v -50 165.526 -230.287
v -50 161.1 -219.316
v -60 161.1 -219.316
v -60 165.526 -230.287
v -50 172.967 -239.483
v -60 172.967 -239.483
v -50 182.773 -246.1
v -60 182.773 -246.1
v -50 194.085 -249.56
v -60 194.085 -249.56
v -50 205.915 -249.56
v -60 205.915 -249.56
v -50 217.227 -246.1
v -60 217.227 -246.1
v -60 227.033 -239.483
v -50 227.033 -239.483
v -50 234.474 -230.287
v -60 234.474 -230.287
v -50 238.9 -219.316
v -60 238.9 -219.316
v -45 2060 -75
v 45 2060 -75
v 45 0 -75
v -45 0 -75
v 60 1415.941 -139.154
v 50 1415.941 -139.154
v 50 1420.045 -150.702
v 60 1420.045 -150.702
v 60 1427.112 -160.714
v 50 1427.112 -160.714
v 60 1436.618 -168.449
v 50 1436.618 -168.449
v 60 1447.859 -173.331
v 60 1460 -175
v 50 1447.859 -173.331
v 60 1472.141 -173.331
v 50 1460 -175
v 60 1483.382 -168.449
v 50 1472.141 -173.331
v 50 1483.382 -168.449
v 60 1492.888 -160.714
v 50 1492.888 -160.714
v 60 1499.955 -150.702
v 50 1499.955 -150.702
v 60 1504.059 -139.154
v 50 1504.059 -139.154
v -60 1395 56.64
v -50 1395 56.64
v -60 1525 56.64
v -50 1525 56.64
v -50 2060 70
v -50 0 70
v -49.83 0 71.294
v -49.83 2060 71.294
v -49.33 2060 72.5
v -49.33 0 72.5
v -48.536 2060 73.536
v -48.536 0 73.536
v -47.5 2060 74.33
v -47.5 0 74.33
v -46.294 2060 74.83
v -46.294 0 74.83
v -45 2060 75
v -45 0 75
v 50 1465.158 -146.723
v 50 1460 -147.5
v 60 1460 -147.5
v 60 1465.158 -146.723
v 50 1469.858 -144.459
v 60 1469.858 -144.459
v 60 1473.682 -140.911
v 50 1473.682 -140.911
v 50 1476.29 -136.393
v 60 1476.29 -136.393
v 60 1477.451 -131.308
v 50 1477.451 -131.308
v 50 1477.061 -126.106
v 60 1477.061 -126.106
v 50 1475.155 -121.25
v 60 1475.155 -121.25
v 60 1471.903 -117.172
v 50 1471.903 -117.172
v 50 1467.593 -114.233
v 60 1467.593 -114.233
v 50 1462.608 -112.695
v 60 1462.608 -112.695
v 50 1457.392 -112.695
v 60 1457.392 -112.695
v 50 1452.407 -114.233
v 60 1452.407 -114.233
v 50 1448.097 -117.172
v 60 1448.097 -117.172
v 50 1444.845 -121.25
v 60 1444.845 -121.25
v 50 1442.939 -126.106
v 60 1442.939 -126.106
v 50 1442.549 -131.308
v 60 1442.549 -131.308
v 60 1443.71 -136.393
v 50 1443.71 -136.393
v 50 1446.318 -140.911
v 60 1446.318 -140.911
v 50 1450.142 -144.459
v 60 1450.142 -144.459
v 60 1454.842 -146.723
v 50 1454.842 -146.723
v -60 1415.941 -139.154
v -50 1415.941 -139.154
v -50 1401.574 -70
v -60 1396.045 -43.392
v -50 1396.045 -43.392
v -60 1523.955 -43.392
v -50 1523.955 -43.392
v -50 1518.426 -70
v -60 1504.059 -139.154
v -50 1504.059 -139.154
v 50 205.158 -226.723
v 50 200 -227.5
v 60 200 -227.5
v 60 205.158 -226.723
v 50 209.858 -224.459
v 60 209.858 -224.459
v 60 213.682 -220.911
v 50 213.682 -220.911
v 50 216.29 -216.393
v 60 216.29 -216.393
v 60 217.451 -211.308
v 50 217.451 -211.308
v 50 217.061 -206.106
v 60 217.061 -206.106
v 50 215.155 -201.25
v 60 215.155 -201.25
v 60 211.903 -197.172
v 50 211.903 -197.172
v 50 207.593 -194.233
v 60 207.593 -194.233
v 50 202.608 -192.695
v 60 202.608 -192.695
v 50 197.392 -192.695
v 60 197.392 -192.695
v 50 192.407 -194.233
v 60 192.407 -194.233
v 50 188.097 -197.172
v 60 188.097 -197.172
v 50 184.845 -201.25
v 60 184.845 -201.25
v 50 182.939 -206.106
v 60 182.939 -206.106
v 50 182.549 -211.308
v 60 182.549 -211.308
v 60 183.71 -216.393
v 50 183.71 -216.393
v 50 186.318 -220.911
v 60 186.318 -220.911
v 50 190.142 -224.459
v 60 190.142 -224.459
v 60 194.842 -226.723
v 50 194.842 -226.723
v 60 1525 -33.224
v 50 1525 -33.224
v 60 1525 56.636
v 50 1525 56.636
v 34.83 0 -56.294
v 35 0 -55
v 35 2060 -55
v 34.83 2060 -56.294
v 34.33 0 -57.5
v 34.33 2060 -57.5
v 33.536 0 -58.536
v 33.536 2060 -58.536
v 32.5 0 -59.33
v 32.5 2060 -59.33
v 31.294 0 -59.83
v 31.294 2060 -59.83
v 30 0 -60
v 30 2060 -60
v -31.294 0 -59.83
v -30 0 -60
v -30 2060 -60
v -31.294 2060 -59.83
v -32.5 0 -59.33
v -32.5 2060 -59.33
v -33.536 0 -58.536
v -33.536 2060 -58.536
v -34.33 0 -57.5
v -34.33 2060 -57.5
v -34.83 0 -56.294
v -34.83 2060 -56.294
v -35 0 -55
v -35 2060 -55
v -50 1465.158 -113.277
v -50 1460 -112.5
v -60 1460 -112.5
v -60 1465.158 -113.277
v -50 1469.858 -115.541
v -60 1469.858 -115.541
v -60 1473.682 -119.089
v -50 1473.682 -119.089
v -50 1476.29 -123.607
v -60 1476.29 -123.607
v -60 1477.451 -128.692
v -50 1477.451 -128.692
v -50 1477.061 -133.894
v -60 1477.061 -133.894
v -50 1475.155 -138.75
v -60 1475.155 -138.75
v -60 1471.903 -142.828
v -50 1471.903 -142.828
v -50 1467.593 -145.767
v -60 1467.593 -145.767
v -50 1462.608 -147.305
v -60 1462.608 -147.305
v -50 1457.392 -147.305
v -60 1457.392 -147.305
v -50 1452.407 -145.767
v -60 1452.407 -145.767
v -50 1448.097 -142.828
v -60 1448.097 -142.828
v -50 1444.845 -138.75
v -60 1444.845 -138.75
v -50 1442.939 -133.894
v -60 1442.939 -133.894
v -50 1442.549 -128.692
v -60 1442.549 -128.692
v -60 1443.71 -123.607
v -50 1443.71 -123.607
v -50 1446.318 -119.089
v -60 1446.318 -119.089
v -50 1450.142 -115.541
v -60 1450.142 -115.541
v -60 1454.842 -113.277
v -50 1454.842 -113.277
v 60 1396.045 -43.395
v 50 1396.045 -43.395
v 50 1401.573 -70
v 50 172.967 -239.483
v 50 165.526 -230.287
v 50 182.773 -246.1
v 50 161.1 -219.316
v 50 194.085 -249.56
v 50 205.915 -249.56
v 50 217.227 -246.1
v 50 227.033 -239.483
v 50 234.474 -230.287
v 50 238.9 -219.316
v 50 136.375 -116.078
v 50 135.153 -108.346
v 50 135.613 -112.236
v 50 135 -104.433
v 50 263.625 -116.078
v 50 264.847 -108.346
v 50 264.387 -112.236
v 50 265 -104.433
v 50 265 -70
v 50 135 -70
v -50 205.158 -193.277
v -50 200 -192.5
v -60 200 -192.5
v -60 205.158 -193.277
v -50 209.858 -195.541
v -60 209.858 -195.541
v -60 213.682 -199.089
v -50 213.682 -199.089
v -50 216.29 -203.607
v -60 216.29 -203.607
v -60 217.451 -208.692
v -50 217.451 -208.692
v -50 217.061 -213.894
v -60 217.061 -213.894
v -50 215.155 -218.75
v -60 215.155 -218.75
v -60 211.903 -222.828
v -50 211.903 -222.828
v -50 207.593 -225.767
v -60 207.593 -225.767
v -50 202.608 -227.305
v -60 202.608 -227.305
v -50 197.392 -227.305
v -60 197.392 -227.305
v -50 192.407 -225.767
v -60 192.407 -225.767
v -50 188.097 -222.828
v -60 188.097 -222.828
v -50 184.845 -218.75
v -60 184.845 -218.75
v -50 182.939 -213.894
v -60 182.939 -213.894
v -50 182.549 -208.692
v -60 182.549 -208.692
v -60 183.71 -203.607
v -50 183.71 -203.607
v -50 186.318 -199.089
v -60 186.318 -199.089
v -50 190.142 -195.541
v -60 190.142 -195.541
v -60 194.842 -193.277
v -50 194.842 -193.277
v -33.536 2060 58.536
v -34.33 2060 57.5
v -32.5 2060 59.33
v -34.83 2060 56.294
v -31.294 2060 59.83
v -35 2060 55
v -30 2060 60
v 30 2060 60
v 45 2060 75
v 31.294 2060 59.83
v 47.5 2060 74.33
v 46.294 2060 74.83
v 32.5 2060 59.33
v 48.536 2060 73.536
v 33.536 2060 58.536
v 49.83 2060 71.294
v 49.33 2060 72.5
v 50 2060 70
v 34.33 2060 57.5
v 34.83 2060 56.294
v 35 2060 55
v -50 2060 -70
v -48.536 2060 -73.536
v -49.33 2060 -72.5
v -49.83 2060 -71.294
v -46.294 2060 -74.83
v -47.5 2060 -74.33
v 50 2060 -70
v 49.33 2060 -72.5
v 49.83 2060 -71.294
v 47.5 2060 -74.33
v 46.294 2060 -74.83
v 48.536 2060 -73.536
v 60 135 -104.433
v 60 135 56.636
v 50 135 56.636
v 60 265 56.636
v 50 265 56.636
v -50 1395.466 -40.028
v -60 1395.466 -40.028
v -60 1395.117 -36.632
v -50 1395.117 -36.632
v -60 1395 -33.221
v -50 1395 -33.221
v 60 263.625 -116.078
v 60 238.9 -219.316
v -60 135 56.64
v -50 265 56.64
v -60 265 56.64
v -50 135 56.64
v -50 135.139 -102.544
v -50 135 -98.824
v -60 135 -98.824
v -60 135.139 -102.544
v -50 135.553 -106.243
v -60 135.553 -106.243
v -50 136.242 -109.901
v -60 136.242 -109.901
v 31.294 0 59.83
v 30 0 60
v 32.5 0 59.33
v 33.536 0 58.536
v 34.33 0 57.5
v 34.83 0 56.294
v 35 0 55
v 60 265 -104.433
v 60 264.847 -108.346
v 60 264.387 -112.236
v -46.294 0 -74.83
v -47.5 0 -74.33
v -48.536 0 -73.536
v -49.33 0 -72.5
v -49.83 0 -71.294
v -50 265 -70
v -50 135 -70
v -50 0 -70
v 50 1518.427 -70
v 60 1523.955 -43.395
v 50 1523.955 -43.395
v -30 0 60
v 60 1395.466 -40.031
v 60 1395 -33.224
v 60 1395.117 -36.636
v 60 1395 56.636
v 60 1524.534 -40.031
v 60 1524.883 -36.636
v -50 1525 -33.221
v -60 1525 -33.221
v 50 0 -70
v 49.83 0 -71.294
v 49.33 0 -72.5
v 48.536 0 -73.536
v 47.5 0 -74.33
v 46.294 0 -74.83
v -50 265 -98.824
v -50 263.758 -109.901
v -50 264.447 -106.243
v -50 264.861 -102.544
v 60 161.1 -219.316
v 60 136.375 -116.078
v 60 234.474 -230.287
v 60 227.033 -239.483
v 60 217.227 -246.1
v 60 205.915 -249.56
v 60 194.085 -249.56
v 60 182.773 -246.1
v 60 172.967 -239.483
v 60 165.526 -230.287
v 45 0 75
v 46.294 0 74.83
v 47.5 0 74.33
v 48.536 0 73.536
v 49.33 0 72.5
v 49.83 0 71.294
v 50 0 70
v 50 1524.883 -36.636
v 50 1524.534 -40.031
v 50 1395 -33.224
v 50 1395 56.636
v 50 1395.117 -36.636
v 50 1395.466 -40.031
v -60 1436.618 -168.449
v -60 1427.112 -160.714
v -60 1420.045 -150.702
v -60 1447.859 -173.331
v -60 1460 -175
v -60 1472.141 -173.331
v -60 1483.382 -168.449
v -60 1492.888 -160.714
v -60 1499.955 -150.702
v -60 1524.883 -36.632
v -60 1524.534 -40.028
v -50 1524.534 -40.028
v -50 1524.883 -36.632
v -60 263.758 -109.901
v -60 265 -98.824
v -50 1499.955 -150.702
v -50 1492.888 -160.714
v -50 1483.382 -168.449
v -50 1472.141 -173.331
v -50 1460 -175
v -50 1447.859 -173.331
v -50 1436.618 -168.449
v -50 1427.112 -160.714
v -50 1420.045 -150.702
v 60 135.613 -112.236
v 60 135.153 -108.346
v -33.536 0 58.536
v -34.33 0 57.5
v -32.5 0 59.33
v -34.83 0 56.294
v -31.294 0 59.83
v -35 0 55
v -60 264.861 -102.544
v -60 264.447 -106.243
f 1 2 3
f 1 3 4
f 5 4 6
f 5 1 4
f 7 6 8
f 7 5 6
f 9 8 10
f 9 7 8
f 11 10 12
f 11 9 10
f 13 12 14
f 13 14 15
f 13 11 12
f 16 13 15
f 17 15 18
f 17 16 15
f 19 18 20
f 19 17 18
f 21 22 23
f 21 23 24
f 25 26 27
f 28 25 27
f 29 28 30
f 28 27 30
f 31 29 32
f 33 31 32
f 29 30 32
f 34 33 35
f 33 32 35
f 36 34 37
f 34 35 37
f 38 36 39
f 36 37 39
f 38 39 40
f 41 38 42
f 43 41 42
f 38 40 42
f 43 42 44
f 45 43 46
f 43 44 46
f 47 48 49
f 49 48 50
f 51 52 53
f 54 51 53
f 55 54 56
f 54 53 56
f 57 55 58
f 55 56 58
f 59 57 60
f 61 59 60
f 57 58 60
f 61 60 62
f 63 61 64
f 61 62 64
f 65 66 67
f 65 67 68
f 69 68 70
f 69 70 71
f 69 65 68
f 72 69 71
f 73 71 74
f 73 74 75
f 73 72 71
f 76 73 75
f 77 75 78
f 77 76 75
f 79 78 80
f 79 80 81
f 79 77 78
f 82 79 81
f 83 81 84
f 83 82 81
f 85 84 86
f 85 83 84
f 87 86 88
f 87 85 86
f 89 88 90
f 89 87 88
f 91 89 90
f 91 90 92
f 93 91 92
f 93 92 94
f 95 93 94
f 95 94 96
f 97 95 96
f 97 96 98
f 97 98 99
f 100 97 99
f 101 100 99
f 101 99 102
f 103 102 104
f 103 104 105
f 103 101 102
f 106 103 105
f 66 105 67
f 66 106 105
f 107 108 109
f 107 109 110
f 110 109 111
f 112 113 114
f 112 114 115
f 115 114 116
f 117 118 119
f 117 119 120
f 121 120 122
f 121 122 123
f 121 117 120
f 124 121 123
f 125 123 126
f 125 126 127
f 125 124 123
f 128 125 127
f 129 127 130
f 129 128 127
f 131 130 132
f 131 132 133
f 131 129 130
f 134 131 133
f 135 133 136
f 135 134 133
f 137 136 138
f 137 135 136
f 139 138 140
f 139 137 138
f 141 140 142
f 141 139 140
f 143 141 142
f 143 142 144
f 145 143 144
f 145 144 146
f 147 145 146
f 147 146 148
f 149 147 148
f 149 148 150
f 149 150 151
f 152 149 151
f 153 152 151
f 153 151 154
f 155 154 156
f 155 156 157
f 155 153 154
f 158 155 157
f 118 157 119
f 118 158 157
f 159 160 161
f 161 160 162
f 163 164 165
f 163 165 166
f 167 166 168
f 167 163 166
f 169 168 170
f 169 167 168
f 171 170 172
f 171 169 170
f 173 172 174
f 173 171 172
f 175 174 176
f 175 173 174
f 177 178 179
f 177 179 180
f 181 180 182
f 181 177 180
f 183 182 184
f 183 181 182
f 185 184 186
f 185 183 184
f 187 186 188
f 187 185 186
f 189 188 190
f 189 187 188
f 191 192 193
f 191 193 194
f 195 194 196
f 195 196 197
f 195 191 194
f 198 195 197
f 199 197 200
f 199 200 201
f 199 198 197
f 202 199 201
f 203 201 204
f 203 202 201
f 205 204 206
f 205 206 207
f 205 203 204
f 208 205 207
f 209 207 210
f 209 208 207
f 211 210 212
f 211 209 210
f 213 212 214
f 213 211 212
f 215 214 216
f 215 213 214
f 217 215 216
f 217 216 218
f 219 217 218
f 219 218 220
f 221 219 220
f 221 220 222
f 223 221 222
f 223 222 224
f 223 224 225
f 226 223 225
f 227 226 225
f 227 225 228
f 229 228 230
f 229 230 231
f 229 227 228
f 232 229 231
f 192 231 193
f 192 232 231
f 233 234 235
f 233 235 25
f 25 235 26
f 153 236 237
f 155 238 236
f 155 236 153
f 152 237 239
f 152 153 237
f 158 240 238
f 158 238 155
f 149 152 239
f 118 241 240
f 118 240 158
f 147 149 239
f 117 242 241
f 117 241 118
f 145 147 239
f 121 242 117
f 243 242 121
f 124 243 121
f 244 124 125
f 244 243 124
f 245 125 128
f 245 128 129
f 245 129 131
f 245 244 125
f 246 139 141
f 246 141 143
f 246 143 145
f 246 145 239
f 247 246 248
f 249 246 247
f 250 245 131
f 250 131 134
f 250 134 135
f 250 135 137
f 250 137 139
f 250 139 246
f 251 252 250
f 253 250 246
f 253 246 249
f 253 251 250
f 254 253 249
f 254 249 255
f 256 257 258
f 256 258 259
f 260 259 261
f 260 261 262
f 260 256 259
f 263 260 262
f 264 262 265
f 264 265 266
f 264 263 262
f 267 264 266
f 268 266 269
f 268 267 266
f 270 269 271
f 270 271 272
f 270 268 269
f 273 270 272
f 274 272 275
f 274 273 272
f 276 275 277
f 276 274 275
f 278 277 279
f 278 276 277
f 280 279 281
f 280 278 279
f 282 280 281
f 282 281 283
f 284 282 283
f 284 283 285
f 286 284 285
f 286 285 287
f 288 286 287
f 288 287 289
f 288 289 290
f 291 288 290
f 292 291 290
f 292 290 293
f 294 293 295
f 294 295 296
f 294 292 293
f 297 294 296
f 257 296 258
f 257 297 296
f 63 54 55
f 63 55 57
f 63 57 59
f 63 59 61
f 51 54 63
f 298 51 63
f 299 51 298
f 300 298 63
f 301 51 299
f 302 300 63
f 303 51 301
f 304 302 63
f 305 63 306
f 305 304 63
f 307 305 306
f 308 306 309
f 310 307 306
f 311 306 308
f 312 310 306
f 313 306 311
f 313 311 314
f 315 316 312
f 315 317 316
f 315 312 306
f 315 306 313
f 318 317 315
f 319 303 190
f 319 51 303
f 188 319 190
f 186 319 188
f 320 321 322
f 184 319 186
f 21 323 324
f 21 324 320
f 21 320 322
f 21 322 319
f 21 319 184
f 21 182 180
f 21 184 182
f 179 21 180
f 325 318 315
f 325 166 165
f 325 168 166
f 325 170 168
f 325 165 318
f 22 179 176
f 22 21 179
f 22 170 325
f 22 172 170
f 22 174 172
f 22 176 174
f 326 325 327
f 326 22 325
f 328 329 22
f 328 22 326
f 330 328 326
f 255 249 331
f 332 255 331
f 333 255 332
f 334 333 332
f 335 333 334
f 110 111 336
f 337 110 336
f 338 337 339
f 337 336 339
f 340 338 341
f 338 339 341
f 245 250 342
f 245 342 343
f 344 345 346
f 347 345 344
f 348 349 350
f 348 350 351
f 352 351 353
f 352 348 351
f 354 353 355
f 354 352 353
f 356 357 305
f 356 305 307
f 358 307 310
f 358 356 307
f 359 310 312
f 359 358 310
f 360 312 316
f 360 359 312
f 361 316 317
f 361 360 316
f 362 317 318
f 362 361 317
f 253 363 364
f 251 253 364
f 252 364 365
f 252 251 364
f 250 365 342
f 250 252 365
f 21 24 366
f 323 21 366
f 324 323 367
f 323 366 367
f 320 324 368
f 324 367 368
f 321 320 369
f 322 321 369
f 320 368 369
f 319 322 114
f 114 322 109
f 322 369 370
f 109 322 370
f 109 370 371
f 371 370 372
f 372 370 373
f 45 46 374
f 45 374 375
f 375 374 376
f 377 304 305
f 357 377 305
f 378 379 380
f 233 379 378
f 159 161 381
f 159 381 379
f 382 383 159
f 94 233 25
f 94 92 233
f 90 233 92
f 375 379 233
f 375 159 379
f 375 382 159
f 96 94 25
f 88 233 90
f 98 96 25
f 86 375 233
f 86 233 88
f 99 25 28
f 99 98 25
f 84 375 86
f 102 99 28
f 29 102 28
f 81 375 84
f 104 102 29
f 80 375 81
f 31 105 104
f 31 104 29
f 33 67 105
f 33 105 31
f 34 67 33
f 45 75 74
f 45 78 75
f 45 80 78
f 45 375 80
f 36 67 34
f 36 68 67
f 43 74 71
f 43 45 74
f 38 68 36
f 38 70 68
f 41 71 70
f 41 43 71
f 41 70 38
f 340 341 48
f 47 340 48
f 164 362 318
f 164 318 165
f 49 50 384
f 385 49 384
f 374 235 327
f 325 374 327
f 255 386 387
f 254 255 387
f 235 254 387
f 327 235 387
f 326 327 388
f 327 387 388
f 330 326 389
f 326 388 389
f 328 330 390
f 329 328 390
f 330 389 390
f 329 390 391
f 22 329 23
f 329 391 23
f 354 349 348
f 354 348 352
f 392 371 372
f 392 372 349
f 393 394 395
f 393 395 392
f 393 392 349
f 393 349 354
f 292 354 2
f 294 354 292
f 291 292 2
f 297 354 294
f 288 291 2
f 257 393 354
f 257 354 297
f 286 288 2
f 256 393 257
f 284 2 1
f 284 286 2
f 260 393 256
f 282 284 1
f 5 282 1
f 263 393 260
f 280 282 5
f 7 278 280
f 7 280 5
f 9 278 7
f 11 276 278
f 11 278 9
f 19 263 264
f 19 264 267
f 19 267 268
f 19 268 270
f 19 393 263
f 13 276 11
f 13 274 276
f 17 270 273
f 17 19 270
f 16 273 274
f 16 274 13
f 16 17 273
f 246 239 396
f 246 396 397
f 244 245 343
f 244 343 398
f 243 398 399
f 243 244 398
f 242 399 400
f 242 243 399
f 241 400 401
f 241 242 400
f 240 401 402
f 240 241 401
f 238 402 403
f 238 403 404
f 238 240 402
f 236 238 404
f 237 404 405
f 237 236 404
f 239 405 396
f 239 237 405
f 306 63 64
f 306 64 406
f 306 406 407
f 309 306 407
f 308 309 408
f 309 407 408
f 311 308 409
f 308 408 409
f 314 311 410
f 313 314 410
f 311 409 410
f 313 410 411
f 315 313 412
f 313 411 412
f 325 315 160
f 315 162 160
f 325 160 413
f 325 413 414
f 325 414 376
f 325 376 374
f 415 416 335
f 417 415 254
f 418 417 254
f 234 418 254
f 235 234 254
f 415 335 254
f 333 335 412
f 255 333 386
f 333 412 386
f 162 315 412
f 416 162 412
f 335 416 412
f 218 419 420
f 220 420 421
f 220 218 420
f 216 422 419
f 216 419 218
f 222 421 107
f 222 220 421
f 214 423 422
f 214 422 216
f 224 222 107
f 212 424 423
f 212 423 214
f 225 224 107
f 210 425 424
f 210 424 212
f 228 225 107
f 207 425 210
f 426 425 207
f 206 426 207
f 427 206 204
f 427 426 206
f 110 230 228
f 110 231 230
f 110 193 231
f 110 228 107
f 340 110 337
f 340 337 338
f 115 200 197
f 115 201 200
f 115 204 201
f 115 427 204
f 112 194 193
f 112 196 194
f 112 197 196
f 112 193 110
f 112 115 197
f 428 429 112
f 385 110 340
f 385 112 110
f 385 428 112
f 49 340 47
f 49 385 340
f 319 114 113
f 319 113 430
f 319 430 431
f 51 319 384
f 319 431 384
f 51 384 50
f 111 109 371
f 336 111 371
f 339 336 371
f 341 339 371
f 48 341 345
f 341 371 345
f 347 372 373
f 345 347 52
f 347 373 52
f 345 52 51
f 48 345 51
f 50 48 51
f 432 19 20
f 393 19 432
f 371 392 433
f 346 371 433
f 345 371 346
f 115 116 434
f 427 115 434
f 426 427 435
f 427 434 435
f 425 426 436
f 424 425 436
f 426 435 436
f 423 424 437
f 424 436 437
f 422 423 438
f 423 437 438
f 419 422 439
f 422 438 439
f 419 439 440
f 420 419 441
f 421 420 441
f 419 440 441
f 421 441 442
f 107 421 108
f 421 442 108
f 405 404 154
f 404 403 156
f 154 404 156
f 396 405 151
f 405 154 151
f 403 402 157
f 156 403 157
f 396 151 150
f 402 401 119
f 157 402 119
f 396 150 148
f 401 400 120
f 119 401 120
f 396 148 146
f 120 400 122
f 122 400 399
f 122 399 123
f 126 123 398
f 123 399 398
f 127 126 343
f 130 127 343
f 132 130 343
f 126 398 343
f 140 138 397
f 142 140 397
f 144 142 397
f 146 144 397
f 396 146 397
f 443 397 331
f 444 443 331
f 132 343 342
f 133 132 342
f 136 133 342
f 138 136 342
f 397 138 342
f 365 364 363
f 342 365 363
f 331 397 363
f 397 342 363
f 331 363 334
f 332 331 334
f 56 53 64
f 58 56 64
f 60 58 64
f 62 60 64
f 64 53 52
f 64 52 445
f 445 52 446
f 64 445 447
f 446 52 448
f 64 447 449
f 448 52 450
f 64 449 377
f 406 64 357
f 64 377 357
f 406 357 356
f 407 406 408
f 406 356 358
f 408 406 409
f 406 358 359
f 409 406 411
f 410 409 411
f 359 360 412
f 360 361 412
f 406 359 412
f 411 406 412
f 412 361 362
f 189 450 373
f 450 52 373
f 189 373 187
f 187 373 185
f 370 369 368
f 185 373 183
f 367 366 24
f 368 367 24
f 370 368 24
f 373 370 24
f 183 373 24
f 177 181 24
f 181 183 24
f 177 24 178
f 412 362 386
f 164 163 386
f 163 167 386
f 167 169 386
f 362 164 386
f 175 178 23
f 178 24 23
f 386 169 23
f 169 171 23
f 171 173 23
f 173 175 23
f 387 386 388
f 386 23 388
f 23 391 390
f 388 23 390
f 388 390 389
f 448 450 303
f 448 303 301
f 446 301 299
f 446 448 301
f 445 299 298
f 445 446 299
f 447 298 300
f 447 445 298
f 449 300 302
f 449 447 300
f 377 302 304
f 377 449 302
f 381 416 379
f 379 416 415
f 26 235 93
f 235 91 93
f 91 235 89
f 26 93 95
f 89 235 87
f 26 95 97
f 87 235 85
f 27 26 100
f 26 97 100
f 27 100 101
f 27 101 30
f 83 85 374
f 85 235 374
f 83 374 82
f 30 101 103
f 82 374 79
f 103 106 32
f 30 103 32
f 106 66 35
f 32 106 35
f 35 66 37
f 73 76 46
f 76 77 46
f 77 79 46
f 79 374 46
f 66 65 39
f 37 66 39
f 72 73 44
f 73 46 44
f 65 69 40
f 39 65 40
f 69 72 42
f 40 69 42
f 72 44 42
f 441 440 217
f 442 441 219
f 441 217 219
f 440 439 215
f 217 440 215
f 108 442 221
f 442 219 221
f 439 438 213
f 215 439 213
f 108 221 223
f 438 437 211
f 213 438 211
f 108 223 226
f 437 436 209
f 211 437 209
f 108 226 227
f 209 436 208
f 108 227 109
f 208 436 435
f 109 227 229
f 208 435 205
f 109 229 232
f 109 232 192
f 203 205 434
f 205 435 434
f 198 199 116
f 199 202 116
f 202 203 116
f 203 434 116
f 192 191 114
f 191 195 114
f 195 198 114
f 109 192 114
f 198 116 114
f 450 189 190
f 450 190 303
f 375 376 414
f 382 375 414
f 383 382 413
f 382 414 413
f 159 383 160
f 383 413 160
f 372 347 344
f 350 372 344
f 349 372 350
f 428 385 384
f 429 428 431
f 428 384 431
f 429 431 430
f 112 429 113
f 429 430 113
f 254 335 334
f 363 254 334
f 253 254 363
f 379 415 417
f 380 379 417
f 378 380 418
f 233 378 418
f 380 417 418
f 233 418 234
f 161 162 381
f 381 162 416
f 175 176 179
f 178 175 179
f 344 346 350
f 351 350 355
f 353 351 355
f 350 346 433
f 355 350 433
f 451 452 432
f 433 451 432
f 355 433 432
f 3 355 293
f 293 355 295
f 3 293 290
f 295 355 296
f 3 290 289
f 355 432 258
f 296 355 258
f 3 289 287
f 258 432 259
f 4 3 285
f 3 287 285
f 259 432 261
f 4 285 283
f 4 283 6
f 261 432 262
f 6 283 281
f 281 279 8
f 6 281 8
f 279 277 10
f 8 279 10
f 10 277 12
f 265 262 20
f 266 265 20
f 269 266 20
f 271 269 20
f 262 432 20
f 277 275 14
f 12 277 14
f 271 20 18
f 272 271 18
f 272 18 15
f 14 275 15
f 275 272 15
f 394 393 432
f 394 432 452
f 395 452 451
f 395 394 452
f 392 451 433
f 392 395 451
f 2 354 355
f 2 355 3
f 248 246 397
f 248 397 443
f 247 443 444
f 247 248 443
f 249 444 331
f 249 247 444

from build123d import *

# Parameters (mm, degrees)
BOSS_EXTRUDE1_DEPTH = 2060
SKETCH2_R           = 17.5
BOSS_EXTRUDE2_DEPTH = 10
SKETCH4_R           = 17.5
BOSS_EXTRUDE3_DEPTH = 10


with BuildPart() as part:
    # Sketch1 → Boss-Extrude1 (new body)
    with BuildSketch(Plane(origin=(0, 0, 0), x_dir=(1, 0, 0), z_dir=(0, 1, 0))):
        with BuildLine():
            Line((-45, -75), (45, -75))
            ThreePointArc((45, -75), (48.535533906, -73.535533906), (50, -70))
            Line((50, -70), (50, 70))
            ThreePointArc((50, 70), (48.535533906, 73.535533906), (45, 75))
            Line((45, 75), (-45, 75))
            ThreePointArc((-45, 75), (-48.535533906, 73.535533906), (-50, 70))
            Line((-50, 70), (-50, -70))
            ThreePointArc((-50, -70), (-48.535533906, -73.535533906), (-45, -75))
        make_face()
        with BuildLine():
            Line((-30, -60), (30, -60))
            ThreePointArc((30, -60), (33.535533906, -58.535533906), (35, -55))
            Line((35, -55), (35, 55))
            ThreePointArc((35, 55), (33.535533906, 58.535533906), (30, 60))
            Line((30, 60), (-30, 60))
            ThreePointArc((-30, 60), (-33.535533906, 58.535533906), (-35, 55))
            Line((-35, 55), (-35, -55))
            ThreePointArc((-35, -55), (-33.535533906, -58.535533906), (-30, -60))
        make_face(mode=Mode.SUBTRACT)
    extrude(amount=BOSS_EXTRUDE1_DEPTH)

    # Sketch2 → Boss-Extrude2 (add)
    with BuildSketch(Plane(origin=(50, 0, 0), x_dir=(0, 0, -1), z_dir=(1, 0, 0))):
        with BuildLine():
            Line((43.395359238, 1396.045447211), (139.154011501, 1415.94090249))
            ThreePointArc((139.154011501, 1415.94090249), (175, 1460), (139.154011501, 1504.05909751))
            Line((139.154011501, 1504.05909751), (43.395359238, 1523.954552789))
            ThreePointArc((43.395359238, 1523.954552789), (38.336590995, 1524.737951503), (33.224235348, 1525))
            Line((33.224235348, 1525), (-56.636474138, 1525))
            Line((-56.636474138, 1525), (-56.636474138, 1460))
            Line((-56.636474138, 1460), (-56.636474138, 1395))
            Line((-56.636474138, 1395), (33.224235348, 1395))
            ThreePointArc((33.224235348, 1395), (38.336590995, 1395.262048497), (43.395359238, 1396.045447211))
        make_face()
        with Locations((130, 1460)):
            Circle(SKETCH2_R, mode=Mode.SUBTRACT)
        with BuildLine():
            Line((-56.636474138, 200), (-56.636474138, 265))
            Line((-56.636474138, 265), (104.432577767, 265))
            ThreePointArc((104.432577767, 265), (110.295724617, 264.655045152), (116.07797063, 263.624940361))
            Line((116.07797063, 263.624940361), (219.31631429, 238.899952288))
            ThreePointArc((219.31631429, 238.899952288), (250, 200), (219.31631429, 161.100047712))
            Line((219.31631429, 161.100047712), (116.07797063, 136.375059639))
            ThreePointArc((116.07797063, 136.375059639), (110.295724617, 135.344954848), (104.432577767, 135))
            Line((104.432577767, 135), (-56.636474138, 135))
            Line((-56.636474138, 135), (-56.636474138, 200))
        make_face()
        with Locations((210, 200)):
            Circle(SKETCH2_R, mode=Mode.SUBTRACT)
    extrude(amount=BOSS_EXTRUDE2_DEPTH)

    # Sketch4 → Boss-Extrude3 (add)
    with BuildSketch(Plane.ZY.offset(50)):
        with BuildLine():
            Line((-219.31631429, 238.899952288), (-109.901430019, 263.757549946))
            ThreePointArc((-109.901430019, 263.757549946), (-104.397629265, 264.688416645), (-98.824367082, 265))
            Line((-98.824367082, 265), (56.64, 265))
            Line((56.64, 265), (56.64, 200))
            Line((56.64, 200), (56.64, 135))
            Line((56.64, 135), (-98.824367082, 135))
            ThreePointArc((-98.824367082, 135), (-104.397629265, 135.311583355), (-109.901430019, 136.242450054))
            Line((-109.901430019, 136.242450054), (-219.31631429, 161.100047712))
            ThreePointArc((-219.31631429, 161.100047712), (-250, 200), (-219.31631429, 238.899952288))
        make_face()
        with Locations((-210, 200)):
            Circle(SKETCH4_R, mode=Mode.SUBTRACT)
        with BuildLine():
            Line((56.64, 1460), (56.64, 1525))
            Line((56.64, 1525), (-33.220885504, 1525))
            ThreePointArc((-33.220885504, 1525), (-38.333067886, 1524.737969312), (-43.391668321, 1523.954623652))
            Line((-43.391668321, 1523.954623652), (-139.154011501, 1504.05909751))
            ThreePointArc((-139.154011501, 1504.05909751), (-175, 1460), (-139.154011501, 1415.94090249))
            Line((-139.154011501, 1415.94090249), (-43.391668321, 1396.045376348))
            ThreePointArc((-43.391668321, 1396.045376348), (-38.333067886, 1395.262030688), (-33.220885504, 1395))
            Line((-33.220885504, 1395), (56.64, 1395))
            Line((56.64, 1395), (56.64, 1460))
        make_face()
        with Locations((-130, 1460)):
            Circle(SKETCH4_R, mode=Mode.SUBTRACT)
    extrude(amount=BOSS_EXTRUDE3_DEPTH)


solid = part.part
